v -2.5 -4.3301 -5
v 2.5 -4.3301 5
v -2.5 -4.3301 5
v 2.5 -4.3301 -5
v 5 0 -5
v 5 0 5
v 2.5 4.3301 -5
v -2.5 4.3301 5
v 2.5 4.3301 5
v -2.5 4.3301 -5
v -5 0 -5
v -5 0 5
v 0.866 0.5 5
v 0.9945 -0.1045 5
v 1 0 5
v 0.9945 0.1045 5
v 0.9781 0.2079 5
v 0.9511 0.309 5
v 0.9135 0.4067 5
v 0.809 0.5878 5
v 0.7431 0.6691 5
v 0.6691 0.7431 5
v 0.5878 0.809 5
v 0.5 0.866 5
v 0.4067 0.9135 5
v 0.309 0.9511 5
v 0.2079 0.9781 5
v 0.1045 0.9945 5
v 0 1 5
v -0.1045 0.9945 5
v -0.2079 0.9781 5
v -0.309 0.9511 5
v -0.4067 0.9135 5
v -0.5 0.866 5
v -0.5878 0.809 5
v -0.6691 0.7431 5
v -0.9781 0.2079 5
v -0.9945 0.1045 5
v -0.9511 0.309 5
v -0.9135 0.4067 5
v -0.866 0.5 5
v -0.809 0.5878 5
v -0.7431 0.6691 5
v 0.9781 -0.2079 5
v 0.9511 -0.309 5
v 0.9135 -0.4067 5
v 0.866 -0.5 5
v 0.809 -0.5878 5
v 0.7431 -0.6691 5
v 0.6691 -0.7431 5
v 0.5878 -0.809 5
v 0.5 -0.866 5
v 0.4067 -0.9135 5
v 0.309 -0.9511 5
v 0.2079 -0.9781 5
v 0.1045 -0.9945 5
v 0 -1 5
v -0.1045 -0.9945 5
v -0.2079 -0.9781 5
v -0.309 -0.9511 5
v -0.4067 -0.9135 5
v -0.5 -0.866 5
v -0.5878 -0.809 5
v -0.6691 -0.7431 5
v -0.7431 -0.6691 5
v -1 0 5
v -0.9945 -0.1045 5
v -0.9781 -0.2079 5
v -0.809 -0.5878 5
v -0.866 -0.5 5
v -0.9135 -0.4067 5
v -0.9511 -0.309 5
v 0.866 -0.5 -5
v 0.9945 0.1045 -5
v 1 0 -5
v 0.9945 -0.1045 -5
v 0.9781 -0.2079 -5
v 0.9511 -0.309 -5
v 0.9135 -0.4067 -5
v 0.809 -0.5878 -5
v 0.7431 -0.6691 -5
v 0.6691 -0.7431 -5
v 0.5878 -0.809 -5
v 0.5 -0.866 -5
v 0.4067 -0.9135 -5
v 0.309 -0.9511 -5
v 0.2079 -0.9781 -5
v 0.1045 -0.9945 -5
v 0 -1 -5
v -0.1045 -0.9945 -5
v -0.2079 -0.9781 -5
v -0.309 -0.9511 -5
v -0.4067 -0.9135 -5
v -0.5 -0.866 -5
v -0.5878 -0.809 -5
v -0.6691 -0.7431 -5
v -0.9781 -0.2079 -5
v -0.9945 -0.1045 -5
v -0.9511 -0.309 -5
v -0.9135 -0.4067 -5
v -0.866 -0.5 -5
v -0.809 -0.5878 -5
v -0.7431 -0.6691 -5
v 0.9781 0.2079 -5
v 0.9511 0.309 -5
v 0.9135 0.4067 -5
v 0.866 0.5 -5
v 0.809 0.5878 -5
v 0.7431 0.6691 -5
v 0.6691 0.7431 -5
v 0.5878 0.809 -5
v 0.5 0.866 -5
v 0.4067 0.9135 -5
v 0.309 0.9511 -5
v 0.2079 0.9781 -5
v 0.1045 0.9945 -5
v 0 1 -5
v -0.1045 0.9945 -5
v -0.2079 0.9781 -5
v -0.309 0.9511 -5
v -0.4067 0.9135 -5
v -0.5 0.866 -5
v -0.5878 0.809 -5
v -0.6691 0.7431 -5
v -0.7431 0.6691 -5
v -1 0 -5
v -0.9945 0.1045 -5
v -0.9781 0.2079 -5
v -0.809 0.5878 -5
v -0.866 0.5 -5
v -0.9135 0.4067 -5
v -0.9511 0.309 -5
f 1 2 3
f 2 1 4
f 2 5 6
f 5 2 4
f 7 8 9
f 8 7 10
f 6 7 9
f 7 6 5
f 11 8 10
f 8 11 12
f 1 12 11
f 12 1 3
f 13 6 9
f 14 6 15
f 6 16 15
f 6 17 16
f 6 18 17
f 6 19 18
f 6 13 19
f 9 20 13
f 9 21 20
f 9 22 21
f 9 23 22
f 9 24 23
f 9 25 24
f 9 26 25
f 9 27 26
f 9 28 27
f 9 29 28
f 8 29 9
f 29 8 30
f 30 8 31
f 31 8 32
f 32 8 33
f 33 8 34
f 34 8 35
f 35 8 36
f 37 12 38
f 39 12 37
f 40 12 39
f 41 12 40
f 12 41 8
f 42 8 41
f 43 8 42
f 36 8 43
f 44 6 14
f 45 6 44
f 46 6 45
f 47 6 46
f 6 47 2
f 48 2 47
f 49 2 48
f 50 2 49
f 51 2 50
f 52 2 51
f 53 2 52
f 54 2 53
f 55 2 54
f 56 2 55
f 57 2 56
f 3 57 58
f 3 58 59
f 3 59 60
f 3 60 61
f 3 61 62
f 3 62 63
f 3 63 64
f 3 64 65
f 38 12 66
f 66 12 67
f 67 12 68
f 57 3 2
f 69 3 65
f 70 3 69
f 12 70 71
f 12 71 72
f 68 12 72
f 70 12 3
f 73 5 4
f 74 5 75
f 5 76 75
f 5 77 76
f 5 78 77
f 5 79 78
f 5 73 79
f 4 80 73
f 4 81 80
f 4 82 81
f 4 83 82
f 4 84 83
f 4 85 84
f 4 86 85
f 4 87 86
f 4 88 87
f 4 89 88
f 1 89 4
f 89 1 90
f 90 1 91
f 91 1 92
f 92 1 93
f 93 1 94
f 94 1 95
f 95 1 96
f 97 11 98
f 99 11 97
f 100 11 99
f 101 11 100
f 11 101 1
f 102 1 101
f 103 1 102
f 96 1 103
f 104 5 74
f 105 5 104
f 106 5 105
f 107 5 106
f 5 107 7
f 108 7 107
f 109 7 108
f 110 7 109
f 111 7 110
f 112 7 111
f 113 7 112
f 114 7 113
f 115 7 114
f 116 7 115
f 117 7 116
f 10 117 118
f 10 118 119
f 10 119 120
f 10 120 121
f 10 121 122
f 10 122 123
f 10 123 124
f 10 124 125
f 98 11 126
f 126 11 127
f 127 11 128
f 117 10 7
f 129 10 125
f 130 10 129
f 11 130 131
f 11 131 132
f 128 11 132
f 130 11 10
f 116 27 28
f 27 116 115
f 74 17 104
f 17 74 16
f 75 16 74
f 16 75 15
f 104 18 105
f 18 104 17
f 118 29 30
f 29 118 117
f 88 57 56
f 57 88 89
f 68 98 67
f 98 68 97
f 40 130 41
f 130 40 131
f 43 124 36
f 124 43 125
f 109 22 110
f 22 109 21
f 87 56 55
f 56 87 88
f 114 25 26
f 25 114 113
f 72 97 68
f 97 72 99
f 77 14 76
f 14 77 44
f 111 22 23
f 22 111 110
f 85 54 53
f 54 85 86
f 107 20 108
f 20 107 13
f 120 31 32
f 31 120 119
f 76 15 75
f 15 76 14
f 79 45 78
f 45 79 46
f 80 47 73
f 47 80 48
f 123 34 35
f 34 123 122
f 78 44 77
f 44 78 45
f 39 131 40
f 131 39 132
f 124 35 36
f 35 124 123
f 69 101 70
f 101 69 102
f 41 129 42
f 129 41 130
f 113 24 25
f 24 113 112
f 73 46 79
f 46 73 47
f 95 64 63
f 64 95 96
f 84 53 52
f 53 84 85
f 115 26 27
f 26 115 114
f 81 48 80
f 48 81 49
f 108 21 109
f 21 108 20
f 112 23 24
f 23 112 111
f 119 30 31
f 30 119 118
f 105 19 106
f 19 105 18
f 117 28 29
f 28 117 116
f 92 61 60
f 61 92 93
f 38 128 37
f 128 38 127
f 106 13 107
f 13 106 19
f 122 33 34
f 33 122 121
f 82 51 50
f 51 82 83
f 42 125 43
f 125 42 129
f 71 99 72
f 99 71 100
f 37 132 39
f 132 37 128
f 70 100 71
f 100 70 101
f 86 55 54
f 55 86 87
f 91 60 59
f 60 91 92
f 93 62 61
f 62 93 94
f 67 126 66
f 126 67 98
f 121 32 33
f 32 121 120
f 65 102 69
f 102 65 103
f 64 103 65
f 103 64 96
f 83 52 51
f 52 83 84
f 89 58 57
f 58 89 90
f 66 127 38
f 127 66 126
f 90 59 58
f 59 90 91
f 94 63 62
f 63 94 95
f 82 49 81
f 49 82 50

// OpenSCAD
$fn = 60;
h = 10;
r_out = 5;
r_in = 1;

difference(){
  cylinder(h, r_out, r_out, center=true,$fn = 6);
  cylinder(h*2, r_in, r_in, center = true);
}
